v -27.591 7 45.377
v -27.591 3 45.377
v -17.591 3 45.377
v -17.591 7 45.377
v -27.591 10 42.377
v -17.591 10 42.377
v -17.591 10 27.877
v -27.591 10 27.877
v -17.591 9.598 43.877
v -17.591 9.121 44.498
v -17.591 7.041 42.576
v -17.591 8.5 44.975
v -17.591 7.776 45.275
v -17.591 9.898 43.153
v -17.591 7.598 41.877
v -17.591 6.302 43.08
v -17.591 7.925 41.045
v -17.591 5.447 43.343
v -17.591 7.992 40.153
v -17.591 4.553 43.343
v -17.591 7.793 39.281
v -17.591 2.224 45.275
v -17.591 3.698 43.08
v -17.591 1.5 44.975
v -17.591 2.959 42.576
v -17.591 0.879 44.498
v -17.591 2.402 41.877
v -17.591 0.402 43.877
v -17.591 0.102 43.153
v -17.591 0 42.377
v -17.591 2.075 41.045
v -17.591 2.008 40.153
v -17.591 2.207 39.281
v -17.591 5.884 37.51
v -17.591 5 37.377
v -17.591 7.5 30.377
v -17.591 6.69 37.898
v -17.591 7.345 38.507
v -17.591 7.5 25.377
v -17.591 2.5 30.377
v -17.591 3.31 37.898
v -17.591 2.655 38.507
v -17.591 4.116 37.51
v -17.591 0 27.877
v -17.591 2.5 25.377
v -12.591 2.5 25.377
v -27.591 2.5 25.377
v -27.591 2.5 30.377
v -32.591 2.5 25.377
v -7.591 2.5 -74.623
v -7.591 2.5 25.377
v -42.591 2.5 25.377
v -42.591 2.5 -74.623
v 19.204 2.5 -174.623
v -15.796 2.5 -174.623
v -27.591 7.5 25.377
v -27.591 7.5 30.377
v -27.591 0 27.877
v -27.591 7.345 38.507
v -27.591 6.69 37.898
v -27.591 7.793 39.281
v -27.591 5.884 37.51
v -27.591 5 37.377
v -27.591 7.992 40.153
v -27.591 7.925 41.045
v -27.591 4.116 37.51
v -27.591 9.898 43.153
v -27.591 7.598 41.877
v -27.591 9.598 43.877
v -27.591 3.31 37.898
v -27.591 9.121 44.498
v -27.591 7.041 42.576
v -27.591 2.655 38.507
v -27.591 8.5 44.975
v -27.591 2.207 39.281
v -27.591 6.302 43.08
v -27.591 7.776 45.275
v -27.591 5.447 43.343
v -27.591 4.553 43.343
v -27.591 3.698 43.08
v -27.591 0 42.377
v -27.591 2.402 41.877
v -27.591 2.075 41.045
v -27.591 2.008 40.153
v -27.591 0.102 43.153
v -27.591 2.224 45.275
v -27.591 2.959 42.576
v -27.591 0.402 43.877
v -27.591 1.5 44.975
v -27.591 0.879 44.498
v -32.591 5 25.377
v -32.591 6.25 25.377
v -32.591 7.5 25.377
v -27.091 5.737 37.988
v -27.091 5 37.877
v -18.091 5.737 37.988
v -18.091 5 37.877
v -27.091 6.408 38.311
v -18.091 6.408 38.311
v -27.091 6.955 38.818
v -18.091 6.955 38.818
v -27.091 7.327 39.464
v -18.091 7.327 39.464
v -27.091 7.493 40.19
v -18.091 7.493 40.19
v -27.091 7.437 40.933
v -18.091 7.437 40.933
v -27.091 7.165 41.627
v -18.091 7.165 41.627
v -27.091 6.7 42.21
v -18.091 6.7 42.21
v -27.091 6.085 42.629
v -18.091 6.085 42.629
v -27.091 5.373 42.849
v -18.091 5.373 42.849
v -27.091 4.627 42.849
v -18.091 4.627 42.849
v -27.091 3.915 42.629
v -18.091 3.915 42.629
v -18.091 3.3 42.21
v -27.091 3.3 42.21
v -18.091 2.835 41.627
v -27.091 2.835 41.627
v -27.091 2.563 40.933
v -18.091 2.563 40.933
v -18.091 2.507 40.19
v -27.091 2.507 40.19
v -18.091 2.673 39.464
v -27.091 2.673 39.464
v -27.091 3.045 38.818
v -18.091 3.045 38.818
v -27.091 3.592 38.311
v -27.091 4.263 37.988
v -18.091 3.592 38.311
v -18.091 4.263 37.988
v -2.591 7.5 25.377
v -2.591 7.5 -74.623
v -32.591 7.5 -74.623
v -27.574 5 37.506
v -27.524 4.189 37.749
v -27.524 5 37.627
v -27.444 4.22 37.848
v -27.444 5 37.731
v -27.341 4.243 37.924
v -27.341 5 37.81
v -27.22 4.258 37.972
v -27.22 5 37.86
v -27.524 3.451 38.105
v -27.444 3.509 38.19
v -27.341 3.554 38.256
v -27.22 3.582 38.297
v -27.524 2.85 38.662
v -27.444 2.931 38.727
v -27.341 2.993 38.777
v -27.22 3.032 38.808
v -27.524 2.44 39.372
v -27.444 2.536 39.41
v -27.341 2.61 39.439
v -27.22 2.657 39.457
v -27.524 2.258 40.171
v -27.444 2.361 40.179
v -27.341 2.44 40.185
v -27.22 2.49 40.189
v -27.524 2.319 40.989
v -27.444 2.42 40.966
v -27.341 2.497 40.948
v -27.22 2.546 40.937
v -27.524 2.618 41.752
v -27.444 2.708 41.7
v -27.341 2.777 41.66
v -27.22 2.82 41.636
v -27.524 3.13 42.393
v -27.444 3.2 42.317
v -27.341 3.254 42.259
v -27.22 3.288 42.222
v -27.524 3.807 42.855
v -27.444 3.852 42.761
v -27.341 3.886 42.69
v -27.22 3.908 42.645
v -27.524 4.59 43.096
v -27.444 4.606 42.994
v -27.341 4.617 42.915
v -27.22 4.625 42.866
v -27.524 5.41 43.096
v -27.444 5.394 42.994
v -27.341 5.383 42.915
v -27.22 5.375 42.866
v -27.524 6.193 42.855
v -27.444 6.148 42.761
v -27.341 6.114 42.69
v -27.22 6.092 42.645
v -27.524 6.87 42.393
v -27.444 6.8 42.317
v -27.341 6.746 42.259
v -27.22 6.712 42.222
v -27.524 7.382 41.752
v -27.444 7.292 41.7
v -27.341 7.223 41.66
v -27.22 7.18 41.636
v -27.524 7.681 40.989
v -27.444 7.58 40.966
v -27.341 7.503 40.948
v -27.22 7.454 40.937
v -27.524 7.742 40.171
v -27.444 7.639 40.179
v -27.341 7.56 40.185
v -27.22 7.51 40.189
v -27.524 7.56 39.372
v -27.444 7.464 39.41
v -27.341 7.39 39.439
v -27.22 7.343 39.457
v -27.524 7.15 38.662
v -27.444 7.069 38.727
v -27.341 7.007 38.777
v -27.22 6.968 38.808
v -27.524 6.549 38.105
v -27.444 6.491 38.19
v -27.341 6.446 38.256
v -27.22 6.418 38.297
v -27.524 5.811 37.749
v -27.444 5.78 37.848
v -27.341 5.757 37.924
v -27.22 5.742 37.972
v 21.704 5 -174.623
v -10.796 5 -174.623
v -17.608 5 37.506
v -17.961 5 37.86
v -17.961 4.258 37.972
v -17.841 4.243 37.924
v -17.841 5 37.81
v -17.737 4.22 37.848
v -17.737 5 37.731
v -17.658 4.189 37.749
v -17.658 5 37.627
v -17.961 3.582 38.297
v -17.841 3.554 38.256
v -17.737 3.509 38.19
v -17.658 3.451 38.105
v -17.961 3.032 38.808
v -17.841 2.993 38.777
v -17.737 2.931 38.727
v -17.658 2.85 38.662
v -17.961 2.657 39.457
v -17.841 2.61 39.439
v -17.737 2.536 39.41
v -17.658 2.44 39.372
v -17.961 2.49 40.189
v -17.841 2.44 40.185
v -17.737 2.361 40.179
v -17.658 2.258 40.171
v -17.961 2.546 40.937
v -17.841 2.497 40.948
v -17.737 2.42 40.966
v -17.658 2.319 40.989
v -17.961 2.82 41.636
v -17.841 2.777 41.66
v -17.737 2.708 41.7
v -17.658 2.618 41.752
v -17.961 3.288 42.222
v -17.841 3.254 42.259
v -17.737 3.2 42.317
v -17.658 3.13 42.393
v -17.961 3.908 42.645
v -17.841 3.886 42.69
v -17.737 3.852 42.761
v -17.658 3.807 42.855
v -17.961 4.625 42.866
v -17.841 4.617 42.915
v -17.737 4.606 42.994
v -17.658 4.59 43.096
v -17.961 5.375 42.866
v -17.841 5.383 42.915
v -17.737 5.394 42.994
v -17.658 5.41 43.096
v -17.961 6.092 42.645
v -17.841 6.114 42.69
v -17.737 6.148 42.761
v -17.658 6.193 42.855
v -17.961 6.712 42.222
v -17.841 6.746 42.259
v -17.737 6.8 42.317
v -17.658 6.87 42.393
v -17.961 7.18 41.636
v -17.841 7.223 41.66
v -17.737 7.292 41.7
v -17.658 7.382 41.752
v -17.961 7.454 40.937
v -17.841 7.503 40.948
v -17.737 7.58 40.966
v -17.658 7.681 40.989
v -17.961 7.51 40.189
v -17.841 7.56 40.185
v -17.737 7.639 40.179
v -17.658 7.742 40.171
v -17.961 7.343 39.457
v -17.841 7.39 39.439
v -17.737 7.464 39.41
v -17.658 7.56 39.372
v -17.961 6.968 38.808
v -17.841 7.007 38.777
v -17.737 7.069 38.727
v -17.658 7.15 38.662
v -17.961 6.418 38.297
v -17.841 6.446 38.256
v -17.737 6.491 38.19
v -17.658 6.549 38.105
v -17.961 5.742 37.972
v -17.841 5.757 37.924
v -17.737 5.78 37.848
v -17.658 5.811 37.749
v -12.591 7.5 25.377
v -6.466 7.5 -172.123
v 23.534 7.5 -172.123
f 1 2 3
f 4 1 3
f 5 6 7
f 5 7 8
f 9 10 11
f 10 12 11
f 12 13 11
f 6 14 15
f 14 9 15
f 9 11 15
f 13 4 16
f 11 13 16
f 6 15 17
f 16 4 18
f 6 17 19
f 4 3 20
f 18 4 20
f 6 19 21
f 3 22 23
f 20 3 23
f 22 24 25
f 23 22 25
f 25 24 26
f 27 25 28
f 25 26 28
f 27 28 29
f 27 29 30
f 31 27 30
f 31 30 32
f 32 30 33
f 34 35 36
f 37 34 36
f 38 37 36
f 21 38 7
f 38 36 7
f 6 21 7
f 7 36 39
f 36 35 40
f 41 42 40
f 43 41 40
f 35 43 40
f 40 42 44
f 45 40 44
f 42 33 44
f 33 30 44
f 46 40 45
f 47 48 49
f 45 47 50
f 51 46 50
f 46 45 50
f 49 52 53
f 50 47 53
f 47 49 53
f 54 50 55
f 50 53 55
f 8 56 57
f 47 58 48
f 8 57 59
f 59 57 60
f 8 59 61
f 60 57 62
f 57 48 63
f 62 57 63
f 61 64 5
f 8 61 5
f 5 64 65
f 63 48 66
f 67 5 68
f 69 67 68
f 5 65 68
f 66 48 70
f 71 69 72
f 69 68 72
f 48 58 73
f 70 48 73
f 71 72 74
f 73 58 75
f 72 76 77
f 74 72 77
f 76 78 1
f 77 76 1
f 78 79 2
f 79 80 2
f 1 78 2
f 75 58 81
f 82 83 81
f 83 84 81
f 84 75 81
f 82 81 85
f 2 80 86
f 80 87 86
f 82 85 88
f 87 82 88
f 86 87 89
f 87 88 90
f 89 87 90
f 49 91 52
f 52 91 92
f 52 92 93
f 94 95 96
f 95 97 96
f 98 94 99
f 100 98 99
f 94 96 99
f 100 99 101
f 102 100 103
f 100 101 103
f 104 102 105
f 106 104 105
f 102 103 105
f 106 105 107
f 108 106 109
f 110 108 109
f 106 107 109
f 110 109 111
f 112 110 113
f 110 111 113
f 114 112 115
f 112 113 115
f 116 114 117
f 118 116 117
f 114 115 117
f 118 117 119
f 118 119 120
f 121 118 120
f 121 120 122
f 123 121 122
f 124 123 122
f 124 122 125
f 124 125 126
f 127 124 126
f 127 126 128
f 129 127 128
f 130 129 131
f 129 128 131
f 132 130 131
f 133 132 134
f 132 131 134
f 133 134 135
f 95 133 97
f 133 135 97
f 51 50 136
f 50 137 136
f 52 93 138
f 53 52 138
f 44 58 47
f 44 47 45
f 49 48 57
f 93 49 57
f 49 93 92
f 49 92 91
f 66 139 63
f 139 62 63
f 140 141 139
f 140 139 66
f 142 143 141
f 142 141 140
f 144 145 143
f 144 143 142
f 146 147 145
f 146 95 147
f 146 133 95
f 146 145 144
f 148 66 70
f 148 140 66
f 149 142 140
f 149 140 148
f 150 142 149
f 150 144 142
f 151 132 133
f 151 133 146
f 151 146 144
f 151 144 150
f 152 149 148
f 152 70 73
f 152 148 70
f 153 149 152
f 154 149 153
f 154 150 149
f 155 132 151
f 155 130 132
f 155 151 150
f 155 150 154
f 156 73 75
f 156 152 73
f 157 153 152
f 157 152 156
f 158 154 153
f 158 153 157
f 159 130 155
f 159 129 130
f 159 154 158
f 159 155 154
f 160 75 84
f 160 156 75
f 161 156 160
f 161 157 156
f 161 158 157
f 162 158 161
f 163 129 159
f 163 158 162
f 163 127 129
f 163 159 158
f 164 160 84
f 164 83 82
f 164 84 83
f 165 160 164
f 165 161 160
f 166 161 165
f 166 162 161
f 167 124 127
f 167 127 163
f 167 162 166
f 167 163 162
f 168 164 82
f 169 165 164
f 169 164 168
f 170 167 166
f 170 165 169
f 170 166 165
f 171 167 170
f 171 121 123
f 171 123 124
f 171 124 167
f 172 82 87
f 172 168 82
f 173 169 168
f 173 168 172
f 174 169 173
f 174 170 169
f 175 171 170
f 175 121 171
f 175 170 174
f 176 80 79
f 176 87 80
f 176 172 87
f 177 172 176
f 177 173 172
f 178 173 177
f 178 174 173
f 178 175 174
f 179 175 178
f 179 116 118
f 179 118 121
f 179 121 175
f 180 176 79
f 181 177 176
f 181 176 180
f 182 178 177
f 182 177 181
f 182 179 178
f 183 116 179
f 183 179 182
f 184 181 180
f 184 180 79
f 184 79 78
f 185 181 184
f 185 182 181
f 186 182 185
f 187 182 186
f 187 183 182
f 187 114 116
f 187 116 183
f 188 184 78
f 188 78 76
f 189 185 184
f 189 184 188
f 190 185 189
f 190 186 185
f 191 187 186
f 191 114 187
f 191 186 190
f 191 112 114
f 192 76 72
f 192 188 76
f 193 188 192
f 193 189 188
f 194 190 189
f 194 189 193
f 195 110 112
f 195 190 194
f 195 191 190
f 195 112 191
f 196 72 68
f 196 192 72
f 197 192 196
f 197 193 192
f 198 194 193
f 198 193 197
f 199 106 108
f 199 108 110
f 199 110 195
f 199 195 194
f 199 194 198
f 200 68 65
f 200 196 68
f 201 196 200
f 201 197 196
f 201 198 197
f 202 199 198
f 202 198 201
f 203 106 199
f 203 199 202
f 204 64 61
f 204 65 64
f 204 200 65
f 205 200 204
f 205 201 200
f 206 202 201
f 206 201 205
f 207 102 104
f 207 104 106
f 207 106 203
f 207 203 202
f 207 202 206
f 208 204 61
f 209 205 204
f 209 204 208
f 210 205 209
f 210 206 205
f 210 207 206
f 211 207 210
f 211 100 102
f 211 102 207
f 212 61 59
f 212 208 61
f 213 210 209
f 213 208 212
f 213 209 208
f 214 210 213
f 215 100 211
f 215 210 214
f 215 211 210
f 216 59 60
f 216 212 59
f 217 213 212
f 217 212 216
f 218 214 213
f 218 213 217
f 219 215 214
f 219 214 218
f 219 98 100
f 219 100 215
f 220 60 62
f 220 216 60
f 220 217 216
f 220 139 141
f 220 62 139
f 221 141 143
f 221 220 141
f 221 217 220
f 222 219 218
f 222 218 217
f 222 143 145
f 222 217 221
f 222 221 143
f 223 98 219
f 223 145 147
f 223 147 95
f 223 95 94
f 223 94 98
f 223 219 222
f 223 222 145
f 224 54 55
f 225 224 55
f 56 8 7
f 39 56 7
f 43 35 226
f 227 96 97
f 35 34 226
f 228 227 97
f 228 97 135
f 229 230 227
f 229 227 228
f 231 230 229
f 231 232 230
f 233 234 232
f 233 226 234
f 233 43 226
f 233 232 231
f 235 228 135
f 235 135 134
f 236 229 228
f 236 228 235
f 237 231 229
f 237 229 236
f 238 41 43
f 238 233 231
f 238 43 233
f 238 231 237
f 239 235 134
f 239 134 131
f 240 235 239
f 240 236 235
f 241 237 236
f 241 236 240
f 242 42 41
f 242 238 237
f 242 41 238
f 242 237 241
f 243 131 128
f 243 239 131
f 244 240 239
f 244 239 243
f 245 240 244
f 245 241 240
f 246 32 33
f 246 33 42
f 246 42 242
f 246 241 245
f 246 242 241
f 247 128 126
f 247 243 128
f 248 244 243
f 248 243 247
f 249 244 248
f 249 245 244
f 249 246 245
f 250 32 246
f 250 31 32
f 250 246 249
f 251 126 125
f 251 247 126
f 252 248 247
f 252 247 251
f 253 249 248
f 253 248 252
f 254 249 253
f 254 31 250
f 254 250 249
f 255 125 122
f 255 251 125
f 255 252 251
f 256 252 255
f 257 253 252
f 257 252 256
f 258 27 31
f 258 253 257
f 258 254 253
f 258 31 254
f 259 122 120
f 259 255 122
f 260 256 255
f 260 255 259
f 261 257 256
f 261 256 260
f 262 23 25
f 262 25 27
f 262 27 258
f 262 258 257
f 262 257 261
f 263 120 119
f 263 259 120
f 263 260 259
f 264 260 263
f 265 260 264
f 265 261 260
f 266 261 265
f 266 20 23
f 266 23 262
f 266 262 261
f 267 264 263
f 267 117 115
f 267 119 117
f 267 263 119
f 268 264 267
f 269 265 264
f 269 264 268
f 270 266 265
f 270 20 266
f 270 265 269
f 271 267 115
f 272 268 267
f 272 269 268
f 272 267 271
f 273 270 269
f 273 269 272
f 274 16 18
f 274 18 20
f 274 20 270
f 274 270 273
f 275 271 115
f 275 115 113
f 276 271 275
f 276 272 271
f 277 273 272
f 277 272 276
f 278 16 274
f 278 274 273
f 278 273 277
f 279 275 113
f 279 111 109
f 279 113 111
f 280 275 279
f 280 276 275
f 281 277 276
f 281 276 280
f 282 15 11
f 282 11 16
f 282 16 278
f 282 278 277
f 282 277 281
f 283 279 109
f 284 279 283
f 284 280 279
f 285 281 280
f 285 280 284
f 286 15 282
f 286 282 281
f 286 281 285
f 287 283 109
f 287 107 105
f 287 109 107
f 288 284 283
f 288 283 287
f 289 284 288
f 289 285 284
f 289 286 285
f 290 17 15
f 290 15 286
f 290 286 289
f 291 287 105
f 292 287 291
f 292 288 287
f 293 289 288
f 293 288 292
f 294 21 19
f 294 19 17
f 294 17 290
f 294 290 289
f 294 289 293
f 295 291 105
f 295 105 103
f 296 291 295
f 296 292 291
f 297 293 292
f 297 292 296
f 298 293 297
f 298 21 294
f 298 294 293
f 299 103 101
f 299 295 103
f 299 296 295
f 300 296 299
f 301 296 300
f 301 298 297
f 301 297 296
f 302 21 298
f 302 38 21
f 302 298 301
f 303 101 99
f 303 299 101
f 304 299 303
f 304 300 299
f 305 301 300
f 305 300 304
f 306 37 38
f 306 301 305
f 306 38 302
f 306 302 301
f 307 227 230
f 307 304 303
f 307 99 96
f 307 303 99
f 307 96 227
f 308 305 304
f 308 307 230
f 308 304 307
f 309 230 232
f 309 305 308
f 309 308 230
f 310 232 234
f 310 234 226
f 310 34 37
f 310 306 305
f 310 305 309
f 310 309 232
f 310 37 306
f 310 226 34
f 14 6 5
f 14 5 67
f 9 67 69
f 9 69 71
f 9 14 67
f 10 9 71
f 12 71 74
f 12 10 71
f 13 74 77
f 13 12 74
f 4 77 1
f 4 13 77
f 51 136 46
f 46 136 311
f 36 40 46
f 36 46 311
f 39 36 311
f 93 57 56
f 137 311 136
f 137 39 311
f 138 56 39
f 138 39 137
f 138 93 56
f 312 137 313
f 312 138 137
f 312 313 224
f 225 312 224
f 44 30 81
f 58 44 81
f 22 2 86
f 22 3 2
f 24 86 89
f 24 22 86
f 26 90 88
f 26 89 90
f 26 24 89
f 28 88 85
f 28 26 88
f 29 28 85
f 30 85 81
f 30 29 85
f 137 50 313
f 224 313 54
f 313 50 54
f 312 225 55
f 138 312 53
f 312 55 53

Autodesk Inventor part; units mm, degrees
ref_plane "YZ Plane" through (0, 0, 0) normal (1, 0, 0) x (0, 1, 0)
sketch "Sketch1" plane through (0, 0, 0) normal (0, 1, 0) x (-1, 0, 0)
  line L0 (27.5907, 45.377) -> (17.5907, 45.377)
  line L1 (17.5907, 45.377) -> (17.5907, 25.377)
  line L2 (17.5907, 25.377) -> (27.5907, 25.377)
  line L3 (27.5907, 25.377) -> (27.5907, 45.377)
  dimension "d0" = 10
  dimension "d1" = 20
extrude "Extrusion1" add sketch "Sketch1" along normal blind 10
sketch "Sketch2" plane through (-17.5907, 0, 45.377) normal (1, 0, 0) x (0, 0, -1)
  line L0 (0, 10) -> (20, 10) construction
  line L1 (0, 10) -> (10, 10) construction
  line L2 (10, 10) -> (10, 0) construction
  line L3 (10, 0) -> (0, 0) construction
  line L4 (0, 0) -> (0, 10) construction
  line L5 (20, 0) -> (20, 10) construction
  line L6 (0, 10) -> (10, 0) construction
  line L7 (0, 0) -> (20, 0) construction
  line L8 (10, 10) -> (0, 0) construction
  circle A0 centre (5, 5) radius 2.5
  point P0 (45.377, 0)
  dimension "d4" = 5
extrude "Extrusion2" cut sketch "Sketch2" against normal through all
fillet "Fillet1" radius 0.5 2 edges at (-17.5907, 5, 42.877) (-27.5907, 5, 42.877)
fillet "Fillet2" radius 3 2 edges at (-22.5907, 10, 45.377) (-22.5907, 0, 45.377)
ref_plane "Work Plane1" through (0, 7.5, 0) normal (0, 1, 0) x (1, 0, 0)
ref_plane "Work Plane2" through (0, 2.5, 0) normal (0, -1, 0) x (1, 0, 0)
sketch "Sketch7" plane through (0, 7.5, 0) normal (0, 1, 0) x (1, 0, 0)
  line L0 (-32.5907, -25.377) -> (-2.5907, -25.377)
  line L1 (-2.5907, -25.377) -> (-2.5907, 74.623)
  line L2 (-2.5907, 74.623) -> (-32.5907, 74.623)
  line L3 (-32.5907, 74.623) -> (-32.5907, -25.377)
  line L4 (-17.5907, -25.377) -> (-27.5907, -25.377) projected
  line L5 (-27.5907, -25.377) -> (-27.5907, -42.377) projected
  line L6 (-17.5907, -42.377) -> (-17.5907, -25.377) projected
  point P0 (0, 0)
  dimension "d30" = 0
  dimension "d31" = 5
  dimension "d32" = 15
  dimension "d33" = 100
sketch "Sketch8" plane through (0, 2.5, 0) normal (0, -1, 0) x (1, 0, 0)
  line L0 (-42.5907, 25.377) -> (-7.5907, 25.377)
  line L1 (-7.5907, 25.377) -> (-7.5907, -74.623)
  line L2 (-7.5907, -74.623) -> (-42.5907, -74.623)
  line L3 (-42.5907, -74.623) -> (-42.5907, 25.377)
  line L4 (-17.5907, 25.377) -> (-27.5907, 25.377) projected
  line L5 (-27.5907, 25.377) -> (-27.5907, 42.377) projected
  line L6 (-17.5907, 42.377) -> (-17.5907, 25.377) projected
  point P0 (0, 0)
  dimension "d34" = 0
  dimension "d35" = 15
  dimension "d36" = 10
  dimension "d37" = 100
loft "Loft4" add profiles "Sketch8", "Sketch7"
sketch "Sketch9" plane through (-17.5907, 0, 42.377) normal (1, 0, 0) x (0, 0, -1)
  line L0 (17, 7.5) -> (17, 10) projected
  line L1 (17, 7.5) -> (12, 7.5)
  line L2 (12, 7.5) -> (12, 2.5)
  line L3 (12, 2.5) -> (17, 2.5)
  line L4 (17, 2.5) -> (17, 7.5)
  line L5 (17, 0) -> (17, 2.5) projected
  point P0 (42.377, 0)
  dimension "d42" = 5
sketch "Sketch10" plane through (-27.5907, 0, 25.377) normal (-1, 0, 0) x (0, 0, 1)
  line L0 (0, 2.5) -> (0, 7.5) projected
  line L1 (0, 7.5) -> (5, 7.5)
  line L2 (5, 7.5) -> (5, 2.5)
  line L3 (5, 2.5) -> (0, 2.5)
  line L4 (0, 2.5) -> (0, 7.5)
  point P0 (-25.377, 0)
  dimension "d43" = 5
extrude "Extrusion3" add sketch "Sketch10" along normal blind 5
extrude "Extrusion4" add sketch "Sketch9" along normal blind 5
chamfer "Chamfer1" distance 5 angle 45 2 edges at (-12.5907, 5, 30.377) (-32.5907, 5, 30.377)
sketch "Sketch11" plane through (-32.5907, 7.5, -74.623) normal (0, 1, 0) x (1, 0, 0)
  line L0 (30, 0) -> (0, 0) projected
  line L1 (30, 0) -> (56.7949, 100)
  line L2 (56.7949, 100) -> (26.7949, 100)
  line L3 (26.7949, 100) -> (0, 0)
  line L4 (30, -100) -> (30, 0) projected
  point P0 (32.5907, -74.623)
  dimension "d52" = 15
  dimension "d53" = 100
sketch "Sketch12" plane through (-42.5907, 2.5, -74.623) normal (0, -1, 0) x (1, 0, 0)
  line L0 (35, 0) -> (0, 0) projected
  line L1 (0, 0) -> (26.7949, -100)
  line L2 (26.7949, -100) -> (61.7949, -100)
  line L3 (61.7949, -100) -> (35, 0)
  line L4 (0, 0) -> (0, 100) projected
  point P0 (42.5907, 74.623)
  dimension "d54" = 100
  dimension "d55" = 15
loft "Loft5" add profiles "Sketch11", "Sketch12"
chamfer "Chamfer2" distance 2.5 angle 45 2 edges at (-22.5907, 0, 25.377) (-22.5907, 10, 25.377)
chamfer "Chamfer3" distance 2.5 angle 45 1 edges at (9.2042, 7.5, -174.623)
equation "\"d35\" = d32"
equation "\"d37\" = d33"
equation "\"d43\" = d42"
equation "\"d54\" = d53"
equation "\"d55\" = d52"
properties part number "Gyrocopter Blade"
